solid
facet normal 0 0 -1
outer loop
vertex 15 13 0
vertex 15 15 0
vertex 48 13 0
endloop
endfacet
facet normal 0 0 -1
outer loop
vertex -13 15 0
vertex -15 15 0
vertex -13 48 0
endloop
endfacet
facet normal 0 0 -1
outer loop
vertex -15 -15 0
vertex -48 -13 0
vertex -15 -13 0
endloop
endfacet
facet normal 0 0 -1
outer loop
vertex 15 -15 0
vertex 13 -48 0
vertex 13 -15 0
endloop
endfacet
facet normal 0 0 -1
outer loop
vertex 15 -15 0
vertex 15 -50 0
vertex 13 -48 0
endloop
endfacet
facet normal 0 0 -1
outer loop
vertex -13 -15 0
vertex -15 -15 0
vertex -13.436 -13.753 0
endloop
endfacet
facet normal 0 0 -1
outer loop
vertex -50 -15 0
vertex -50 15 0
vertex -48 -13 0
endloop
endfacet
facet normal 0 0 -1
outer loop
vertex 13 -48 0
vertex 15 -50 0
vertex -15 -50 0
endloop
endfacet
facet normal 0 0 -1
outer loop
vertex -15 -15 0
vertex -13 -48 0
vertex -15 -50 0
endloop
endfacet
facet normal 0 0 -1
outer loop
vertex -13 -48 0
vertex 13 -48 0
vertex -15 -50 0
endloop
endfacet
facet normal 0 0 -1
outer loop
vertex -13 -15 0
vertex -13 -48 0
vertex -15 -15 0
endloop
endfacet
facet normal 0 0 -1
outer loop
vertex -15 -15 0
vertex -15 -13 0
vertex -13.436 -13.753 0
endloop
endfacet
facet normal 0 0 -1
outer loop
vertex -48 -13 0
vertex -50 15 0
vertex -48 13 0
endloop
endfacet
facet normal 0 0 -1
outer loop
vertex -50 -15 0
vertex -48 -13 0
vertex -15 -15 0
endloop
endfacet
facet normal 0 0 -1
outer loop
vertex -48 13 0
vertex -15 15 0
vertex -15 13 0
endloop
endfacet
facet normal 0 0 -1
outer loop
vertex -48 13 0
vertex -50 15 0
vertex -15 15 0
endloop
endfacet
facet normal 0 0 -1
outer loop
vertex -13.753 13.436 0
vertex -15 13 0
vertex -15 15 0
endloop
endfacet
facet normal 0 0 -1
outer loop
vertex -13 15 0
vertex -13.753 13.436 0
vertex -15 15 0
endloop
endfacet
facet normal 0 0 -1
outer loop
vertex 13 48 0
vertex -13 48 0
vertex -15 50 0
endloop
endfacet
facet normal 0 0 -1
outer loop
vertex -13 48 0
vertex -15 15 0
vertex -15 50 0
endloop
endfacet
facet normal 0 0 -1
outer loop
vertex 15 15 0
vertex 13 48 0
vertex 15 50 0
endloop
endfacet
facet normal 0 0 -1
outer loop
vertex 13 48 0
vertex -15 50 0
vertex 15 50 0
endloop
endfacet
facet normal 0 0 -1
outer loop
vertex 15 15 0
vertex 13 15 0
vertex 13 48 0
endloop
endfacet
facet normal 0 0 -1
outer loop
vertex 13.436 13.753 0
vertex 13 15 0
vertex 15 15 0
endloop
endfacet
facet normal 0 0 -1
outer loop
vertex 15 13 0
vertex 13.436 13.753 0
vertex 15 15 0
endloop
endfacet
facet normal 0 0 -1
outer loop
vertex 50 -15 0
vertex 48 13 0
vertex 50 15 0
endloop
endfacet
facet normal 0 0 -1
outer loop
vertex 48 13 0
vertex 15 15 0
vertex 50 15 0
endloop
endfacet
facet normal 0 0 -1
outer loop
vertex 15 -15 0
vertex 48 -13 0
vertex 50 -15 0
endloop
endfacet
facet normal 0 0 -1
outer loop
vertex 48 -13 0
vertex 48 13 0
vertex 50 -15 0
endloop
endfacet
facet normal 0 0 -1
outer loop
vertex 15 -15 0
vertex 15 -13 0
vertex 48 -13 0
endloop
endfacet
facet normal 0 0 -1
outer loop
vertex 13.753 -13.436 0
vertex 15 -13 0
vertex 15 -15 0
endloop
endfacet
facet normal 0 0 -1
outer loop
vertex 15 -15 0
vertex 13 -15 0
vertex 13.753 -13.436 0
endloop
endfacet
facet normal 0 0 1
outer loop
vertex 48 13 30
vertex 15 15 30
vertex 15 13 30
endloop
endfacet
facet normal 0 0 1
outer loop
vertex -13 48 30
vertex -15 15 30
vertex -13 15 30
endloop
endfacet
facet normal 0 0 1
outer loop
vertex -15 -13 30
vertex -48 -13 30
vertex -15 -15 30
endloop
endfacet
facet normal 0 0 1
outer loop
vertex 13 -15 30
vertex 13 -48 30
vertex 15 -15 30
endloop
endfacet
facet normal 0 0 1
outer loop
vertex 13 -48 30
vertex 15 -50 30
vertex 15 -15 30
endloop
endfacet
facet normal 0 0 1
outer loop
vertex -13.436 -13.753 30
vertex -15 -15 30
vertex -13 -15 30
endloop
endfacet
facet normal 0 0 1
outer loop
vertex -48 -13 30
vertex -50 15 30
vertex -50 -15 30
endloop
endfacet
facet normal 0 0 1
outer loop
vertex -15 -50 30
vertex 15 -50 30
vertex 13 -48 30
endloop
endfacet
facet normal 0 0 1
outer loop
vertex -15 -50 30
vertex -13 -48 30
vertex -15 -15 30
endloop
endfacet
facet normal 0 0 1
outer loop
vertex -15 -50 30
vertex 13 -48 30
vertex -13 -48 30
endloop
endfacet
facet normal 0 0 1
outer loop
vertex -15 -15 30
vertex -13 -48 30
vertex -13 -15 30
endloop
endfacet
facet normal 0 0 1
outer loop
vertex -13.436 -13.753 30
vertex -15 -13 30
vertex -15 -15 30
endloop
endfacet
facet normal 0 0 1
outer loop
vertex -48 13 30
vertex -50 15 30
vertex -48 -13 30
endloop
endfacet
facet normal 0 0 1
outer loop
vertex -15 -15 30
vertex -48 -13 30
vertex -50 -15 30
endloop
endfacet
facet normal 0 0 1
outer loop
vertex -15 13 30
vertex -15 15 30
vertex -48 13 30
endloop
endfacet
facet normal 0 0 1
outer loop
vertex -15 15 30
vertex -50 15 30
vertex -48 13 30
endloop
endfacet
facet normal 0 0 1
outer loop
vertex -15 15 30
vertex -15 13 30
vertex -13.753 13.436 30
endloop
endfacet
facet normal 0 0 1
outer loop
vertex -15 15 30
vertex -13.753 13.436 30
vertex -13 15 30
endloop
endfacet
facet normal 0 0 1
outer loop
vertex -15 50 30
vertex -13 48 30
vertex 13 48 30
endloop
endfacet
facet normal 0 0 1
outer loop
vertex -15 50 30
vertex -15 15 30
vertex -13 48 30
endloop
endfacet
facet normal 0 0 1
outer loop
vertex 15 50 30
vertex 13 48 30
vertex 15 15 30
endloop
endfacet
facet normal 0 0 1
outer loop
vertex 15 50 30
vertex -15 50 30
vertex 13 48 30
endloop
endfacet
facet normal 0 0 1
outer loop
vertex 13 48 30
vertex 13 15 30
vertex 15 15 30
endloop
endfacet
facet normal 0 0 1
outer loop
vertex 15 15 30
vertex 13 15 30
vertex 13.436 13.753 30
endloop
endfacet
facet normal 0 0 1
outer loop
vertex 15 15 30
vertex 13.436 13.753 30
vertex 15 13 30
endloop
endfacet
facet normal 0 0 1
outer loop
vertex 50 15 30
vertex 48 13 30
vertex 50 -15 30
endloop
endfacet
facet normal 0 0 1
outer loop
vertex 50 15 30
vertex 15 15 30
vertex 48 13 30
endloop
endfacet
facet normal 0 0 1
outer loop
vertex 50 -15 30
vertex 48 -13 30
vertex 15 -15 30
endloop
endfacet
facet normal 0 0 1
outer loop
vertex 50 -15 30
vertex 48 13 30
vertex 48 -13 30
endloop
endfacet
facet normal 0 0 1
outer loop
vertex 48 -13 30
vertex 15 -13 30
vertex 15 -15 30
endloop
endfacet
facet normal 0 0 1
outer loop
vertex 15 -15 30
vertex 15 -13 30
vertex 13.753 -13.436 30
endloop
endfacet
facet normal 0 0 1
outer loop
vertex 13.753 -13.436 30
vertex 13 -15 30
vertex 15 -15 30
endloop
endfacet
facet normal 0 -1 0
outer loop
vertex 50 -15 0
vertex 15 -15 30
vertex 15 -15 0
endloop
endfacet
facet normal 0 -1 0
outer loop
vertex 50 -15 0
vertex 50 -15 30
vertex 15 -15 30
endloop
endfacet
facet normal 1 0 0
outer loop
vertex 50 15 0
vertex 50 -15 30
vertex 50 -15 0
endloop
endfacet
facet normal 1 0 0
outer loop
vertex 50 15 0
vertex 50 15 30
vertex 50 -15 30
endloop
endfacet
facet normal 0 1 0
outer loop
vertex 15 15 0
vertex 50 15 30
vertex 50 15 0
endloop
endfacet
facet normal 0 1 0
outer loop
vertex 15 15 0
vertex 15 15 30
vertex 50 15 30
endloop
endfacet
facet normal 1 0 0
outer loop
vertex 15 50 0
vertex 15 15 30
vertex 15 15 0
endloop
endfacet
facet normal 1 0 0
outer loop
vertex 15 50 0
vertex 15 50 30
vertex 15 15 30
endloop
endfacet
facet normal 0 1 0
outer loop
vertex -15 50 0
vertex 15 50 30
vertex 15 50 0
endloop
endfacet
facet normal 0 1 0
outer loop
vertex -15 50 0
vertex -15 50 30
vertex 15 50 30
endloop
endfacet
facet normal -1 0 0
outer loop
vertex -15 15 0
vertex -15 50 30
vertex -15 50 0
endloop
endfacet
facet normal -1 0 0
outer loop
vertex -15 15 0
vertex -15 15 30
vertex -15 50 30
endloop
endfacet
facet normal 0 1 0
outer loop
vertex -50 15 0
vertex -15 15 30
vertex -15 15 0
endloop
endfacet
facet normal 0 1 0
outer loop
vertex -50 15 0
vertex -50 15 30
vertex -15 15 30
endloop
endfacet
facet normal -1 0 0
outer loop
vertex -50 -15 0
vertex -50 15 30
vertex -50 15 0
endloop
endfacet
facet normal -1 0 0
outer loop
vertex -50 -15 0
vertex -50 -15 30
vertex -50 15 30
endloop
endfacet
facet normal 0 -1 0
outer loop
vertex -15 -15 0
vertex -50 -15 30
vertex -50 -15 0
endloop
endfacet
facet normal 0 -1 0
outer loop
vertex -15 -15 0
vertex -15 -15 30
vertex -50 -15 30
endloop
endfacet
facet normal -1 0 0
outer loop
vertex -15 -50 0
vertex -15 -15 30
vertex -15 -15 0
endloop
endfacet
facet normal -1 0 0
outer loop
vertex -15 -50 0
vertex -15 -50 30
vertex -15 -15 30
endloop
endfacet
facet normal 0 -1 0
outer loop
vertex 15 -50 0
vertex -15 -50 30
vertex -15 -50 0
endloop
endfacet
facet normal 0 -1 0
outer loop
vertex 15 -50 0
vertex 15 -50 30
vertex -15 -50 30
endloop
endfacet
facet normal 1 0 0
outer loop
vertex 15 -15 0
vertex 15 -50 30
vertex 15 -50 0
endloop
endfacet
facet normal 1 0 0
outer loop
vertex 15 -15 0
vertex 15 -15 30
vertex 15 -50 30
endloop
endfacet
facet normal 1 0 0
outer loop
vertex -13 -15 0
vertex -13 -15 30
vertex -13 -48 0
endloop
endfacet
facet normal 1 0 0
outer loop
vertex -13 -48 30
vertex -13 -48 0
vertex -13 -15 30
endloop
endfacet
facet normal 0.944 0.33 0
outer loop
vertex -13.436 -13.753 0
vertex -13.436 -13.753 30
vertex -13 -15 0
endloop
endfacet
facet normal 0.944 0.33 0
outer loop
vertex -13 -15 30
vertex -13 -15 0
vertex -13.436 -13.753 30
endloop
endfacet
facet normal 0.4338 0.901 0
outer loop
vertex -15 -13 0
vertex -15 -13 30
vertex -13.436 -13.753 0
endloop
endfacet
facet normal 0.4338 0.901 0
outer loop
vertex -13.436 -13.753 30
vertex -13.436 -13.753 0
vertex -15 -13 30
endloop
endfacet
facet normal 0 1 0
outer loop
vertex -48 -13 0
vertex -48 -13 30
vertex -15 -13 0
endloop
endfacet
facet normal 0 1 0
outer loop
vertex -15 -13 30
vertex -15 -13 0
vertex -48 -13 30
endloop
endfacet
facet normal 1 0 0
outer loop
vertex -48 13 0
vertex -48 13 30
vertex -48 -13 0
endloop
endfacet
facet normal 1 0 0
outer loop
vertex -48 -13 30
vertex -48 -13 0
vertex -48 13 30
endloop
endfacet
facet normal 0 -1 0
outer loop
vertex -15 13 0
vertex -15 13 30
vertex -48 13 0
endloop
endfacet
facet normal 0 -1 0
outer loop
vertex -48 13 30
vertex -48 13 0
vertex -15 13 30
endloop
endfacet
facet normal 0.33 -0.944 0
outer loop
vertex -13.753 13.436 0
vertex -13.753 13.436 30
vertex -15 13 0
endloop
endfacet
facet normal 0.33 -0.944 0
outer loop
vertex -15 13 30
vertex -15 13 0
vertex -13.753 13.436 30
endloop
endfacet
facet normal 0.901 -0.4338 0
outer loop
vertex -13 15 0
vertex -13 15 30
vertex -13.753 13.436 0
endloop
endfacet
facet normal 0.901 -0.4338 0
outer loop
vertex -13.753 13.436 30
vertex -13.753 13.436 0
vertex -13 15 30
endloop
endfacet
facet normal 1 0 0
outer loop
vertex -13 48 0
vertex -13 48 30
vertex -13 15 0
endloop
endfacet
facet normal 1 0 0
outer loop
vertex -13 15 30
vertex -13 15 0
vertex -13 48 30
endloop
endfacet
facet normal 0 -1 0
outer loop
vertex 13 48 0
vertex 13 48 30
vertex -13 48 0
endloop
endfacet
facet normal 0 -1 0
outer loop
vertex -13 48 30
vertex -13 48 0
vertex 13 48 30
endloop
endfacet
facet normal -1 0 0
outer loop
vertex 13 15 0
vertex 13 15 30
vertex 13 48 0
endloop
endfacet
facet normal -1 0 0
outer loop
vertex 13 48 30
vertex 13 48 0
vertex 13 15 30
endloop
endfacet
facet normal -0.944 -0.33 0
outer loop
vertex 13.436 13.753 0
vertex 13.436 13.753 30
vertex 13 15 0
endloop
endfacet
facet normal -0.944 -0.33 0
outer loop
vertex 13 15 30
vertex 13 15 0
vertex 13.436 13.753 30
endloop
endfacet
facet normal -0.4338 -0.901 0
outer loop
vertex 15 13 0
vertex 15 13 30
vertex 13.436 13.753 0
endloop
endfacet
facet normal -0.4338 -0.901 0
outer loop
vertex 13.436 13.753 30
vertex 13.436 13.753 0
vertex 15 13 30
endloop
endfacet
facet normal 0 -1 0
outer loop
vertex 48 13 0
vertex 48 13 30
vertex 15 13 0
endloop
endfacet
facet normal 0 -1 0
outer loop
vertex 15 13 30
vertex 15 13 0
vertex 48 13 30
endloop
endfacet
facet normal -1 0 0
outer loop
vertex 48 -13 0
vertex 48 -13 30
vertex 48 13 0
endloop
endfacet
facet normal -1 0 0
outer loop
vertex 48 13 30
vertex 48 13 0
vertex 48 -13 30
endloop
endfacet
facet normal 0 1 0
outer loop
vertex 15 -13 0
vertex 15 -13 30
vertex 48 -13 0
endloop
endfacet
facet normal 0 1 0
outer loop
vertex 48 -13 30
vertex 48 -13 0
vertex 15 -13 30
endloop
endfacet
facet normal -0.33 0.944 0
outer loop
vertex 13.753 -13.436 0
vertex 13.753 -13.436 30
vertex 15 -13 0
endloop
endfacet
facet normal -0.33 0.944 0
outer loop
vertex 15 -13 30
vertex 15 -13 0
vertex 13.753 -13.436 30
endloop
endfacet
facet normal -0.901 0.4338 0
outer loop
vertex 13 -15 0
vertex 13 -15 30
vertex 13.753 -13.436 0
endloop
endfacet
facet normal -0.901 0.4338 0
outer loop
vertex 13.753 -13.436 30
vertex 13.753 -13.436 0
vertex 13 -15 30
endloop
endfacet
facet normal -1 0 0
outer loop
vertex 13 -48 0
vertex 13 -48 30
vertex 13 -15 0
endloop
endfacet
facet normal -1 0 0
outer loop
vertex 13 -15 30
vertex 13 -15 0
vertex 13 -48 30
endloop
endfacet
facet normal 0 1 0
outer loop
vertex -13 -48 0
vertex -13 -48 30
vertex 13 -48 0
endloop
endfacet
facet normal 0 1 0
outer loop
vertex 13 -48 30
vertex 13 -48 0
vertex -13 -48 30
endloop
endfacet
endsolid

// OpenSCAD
linear_extrude(30)
	difference() {
		union() {
			square([100, 30], center=true);
			square([30, 100], center=true);
		}
		offset(-2) {
			square([100, 30], center=true);
			square([30, 100], center=true);
		}
	}
